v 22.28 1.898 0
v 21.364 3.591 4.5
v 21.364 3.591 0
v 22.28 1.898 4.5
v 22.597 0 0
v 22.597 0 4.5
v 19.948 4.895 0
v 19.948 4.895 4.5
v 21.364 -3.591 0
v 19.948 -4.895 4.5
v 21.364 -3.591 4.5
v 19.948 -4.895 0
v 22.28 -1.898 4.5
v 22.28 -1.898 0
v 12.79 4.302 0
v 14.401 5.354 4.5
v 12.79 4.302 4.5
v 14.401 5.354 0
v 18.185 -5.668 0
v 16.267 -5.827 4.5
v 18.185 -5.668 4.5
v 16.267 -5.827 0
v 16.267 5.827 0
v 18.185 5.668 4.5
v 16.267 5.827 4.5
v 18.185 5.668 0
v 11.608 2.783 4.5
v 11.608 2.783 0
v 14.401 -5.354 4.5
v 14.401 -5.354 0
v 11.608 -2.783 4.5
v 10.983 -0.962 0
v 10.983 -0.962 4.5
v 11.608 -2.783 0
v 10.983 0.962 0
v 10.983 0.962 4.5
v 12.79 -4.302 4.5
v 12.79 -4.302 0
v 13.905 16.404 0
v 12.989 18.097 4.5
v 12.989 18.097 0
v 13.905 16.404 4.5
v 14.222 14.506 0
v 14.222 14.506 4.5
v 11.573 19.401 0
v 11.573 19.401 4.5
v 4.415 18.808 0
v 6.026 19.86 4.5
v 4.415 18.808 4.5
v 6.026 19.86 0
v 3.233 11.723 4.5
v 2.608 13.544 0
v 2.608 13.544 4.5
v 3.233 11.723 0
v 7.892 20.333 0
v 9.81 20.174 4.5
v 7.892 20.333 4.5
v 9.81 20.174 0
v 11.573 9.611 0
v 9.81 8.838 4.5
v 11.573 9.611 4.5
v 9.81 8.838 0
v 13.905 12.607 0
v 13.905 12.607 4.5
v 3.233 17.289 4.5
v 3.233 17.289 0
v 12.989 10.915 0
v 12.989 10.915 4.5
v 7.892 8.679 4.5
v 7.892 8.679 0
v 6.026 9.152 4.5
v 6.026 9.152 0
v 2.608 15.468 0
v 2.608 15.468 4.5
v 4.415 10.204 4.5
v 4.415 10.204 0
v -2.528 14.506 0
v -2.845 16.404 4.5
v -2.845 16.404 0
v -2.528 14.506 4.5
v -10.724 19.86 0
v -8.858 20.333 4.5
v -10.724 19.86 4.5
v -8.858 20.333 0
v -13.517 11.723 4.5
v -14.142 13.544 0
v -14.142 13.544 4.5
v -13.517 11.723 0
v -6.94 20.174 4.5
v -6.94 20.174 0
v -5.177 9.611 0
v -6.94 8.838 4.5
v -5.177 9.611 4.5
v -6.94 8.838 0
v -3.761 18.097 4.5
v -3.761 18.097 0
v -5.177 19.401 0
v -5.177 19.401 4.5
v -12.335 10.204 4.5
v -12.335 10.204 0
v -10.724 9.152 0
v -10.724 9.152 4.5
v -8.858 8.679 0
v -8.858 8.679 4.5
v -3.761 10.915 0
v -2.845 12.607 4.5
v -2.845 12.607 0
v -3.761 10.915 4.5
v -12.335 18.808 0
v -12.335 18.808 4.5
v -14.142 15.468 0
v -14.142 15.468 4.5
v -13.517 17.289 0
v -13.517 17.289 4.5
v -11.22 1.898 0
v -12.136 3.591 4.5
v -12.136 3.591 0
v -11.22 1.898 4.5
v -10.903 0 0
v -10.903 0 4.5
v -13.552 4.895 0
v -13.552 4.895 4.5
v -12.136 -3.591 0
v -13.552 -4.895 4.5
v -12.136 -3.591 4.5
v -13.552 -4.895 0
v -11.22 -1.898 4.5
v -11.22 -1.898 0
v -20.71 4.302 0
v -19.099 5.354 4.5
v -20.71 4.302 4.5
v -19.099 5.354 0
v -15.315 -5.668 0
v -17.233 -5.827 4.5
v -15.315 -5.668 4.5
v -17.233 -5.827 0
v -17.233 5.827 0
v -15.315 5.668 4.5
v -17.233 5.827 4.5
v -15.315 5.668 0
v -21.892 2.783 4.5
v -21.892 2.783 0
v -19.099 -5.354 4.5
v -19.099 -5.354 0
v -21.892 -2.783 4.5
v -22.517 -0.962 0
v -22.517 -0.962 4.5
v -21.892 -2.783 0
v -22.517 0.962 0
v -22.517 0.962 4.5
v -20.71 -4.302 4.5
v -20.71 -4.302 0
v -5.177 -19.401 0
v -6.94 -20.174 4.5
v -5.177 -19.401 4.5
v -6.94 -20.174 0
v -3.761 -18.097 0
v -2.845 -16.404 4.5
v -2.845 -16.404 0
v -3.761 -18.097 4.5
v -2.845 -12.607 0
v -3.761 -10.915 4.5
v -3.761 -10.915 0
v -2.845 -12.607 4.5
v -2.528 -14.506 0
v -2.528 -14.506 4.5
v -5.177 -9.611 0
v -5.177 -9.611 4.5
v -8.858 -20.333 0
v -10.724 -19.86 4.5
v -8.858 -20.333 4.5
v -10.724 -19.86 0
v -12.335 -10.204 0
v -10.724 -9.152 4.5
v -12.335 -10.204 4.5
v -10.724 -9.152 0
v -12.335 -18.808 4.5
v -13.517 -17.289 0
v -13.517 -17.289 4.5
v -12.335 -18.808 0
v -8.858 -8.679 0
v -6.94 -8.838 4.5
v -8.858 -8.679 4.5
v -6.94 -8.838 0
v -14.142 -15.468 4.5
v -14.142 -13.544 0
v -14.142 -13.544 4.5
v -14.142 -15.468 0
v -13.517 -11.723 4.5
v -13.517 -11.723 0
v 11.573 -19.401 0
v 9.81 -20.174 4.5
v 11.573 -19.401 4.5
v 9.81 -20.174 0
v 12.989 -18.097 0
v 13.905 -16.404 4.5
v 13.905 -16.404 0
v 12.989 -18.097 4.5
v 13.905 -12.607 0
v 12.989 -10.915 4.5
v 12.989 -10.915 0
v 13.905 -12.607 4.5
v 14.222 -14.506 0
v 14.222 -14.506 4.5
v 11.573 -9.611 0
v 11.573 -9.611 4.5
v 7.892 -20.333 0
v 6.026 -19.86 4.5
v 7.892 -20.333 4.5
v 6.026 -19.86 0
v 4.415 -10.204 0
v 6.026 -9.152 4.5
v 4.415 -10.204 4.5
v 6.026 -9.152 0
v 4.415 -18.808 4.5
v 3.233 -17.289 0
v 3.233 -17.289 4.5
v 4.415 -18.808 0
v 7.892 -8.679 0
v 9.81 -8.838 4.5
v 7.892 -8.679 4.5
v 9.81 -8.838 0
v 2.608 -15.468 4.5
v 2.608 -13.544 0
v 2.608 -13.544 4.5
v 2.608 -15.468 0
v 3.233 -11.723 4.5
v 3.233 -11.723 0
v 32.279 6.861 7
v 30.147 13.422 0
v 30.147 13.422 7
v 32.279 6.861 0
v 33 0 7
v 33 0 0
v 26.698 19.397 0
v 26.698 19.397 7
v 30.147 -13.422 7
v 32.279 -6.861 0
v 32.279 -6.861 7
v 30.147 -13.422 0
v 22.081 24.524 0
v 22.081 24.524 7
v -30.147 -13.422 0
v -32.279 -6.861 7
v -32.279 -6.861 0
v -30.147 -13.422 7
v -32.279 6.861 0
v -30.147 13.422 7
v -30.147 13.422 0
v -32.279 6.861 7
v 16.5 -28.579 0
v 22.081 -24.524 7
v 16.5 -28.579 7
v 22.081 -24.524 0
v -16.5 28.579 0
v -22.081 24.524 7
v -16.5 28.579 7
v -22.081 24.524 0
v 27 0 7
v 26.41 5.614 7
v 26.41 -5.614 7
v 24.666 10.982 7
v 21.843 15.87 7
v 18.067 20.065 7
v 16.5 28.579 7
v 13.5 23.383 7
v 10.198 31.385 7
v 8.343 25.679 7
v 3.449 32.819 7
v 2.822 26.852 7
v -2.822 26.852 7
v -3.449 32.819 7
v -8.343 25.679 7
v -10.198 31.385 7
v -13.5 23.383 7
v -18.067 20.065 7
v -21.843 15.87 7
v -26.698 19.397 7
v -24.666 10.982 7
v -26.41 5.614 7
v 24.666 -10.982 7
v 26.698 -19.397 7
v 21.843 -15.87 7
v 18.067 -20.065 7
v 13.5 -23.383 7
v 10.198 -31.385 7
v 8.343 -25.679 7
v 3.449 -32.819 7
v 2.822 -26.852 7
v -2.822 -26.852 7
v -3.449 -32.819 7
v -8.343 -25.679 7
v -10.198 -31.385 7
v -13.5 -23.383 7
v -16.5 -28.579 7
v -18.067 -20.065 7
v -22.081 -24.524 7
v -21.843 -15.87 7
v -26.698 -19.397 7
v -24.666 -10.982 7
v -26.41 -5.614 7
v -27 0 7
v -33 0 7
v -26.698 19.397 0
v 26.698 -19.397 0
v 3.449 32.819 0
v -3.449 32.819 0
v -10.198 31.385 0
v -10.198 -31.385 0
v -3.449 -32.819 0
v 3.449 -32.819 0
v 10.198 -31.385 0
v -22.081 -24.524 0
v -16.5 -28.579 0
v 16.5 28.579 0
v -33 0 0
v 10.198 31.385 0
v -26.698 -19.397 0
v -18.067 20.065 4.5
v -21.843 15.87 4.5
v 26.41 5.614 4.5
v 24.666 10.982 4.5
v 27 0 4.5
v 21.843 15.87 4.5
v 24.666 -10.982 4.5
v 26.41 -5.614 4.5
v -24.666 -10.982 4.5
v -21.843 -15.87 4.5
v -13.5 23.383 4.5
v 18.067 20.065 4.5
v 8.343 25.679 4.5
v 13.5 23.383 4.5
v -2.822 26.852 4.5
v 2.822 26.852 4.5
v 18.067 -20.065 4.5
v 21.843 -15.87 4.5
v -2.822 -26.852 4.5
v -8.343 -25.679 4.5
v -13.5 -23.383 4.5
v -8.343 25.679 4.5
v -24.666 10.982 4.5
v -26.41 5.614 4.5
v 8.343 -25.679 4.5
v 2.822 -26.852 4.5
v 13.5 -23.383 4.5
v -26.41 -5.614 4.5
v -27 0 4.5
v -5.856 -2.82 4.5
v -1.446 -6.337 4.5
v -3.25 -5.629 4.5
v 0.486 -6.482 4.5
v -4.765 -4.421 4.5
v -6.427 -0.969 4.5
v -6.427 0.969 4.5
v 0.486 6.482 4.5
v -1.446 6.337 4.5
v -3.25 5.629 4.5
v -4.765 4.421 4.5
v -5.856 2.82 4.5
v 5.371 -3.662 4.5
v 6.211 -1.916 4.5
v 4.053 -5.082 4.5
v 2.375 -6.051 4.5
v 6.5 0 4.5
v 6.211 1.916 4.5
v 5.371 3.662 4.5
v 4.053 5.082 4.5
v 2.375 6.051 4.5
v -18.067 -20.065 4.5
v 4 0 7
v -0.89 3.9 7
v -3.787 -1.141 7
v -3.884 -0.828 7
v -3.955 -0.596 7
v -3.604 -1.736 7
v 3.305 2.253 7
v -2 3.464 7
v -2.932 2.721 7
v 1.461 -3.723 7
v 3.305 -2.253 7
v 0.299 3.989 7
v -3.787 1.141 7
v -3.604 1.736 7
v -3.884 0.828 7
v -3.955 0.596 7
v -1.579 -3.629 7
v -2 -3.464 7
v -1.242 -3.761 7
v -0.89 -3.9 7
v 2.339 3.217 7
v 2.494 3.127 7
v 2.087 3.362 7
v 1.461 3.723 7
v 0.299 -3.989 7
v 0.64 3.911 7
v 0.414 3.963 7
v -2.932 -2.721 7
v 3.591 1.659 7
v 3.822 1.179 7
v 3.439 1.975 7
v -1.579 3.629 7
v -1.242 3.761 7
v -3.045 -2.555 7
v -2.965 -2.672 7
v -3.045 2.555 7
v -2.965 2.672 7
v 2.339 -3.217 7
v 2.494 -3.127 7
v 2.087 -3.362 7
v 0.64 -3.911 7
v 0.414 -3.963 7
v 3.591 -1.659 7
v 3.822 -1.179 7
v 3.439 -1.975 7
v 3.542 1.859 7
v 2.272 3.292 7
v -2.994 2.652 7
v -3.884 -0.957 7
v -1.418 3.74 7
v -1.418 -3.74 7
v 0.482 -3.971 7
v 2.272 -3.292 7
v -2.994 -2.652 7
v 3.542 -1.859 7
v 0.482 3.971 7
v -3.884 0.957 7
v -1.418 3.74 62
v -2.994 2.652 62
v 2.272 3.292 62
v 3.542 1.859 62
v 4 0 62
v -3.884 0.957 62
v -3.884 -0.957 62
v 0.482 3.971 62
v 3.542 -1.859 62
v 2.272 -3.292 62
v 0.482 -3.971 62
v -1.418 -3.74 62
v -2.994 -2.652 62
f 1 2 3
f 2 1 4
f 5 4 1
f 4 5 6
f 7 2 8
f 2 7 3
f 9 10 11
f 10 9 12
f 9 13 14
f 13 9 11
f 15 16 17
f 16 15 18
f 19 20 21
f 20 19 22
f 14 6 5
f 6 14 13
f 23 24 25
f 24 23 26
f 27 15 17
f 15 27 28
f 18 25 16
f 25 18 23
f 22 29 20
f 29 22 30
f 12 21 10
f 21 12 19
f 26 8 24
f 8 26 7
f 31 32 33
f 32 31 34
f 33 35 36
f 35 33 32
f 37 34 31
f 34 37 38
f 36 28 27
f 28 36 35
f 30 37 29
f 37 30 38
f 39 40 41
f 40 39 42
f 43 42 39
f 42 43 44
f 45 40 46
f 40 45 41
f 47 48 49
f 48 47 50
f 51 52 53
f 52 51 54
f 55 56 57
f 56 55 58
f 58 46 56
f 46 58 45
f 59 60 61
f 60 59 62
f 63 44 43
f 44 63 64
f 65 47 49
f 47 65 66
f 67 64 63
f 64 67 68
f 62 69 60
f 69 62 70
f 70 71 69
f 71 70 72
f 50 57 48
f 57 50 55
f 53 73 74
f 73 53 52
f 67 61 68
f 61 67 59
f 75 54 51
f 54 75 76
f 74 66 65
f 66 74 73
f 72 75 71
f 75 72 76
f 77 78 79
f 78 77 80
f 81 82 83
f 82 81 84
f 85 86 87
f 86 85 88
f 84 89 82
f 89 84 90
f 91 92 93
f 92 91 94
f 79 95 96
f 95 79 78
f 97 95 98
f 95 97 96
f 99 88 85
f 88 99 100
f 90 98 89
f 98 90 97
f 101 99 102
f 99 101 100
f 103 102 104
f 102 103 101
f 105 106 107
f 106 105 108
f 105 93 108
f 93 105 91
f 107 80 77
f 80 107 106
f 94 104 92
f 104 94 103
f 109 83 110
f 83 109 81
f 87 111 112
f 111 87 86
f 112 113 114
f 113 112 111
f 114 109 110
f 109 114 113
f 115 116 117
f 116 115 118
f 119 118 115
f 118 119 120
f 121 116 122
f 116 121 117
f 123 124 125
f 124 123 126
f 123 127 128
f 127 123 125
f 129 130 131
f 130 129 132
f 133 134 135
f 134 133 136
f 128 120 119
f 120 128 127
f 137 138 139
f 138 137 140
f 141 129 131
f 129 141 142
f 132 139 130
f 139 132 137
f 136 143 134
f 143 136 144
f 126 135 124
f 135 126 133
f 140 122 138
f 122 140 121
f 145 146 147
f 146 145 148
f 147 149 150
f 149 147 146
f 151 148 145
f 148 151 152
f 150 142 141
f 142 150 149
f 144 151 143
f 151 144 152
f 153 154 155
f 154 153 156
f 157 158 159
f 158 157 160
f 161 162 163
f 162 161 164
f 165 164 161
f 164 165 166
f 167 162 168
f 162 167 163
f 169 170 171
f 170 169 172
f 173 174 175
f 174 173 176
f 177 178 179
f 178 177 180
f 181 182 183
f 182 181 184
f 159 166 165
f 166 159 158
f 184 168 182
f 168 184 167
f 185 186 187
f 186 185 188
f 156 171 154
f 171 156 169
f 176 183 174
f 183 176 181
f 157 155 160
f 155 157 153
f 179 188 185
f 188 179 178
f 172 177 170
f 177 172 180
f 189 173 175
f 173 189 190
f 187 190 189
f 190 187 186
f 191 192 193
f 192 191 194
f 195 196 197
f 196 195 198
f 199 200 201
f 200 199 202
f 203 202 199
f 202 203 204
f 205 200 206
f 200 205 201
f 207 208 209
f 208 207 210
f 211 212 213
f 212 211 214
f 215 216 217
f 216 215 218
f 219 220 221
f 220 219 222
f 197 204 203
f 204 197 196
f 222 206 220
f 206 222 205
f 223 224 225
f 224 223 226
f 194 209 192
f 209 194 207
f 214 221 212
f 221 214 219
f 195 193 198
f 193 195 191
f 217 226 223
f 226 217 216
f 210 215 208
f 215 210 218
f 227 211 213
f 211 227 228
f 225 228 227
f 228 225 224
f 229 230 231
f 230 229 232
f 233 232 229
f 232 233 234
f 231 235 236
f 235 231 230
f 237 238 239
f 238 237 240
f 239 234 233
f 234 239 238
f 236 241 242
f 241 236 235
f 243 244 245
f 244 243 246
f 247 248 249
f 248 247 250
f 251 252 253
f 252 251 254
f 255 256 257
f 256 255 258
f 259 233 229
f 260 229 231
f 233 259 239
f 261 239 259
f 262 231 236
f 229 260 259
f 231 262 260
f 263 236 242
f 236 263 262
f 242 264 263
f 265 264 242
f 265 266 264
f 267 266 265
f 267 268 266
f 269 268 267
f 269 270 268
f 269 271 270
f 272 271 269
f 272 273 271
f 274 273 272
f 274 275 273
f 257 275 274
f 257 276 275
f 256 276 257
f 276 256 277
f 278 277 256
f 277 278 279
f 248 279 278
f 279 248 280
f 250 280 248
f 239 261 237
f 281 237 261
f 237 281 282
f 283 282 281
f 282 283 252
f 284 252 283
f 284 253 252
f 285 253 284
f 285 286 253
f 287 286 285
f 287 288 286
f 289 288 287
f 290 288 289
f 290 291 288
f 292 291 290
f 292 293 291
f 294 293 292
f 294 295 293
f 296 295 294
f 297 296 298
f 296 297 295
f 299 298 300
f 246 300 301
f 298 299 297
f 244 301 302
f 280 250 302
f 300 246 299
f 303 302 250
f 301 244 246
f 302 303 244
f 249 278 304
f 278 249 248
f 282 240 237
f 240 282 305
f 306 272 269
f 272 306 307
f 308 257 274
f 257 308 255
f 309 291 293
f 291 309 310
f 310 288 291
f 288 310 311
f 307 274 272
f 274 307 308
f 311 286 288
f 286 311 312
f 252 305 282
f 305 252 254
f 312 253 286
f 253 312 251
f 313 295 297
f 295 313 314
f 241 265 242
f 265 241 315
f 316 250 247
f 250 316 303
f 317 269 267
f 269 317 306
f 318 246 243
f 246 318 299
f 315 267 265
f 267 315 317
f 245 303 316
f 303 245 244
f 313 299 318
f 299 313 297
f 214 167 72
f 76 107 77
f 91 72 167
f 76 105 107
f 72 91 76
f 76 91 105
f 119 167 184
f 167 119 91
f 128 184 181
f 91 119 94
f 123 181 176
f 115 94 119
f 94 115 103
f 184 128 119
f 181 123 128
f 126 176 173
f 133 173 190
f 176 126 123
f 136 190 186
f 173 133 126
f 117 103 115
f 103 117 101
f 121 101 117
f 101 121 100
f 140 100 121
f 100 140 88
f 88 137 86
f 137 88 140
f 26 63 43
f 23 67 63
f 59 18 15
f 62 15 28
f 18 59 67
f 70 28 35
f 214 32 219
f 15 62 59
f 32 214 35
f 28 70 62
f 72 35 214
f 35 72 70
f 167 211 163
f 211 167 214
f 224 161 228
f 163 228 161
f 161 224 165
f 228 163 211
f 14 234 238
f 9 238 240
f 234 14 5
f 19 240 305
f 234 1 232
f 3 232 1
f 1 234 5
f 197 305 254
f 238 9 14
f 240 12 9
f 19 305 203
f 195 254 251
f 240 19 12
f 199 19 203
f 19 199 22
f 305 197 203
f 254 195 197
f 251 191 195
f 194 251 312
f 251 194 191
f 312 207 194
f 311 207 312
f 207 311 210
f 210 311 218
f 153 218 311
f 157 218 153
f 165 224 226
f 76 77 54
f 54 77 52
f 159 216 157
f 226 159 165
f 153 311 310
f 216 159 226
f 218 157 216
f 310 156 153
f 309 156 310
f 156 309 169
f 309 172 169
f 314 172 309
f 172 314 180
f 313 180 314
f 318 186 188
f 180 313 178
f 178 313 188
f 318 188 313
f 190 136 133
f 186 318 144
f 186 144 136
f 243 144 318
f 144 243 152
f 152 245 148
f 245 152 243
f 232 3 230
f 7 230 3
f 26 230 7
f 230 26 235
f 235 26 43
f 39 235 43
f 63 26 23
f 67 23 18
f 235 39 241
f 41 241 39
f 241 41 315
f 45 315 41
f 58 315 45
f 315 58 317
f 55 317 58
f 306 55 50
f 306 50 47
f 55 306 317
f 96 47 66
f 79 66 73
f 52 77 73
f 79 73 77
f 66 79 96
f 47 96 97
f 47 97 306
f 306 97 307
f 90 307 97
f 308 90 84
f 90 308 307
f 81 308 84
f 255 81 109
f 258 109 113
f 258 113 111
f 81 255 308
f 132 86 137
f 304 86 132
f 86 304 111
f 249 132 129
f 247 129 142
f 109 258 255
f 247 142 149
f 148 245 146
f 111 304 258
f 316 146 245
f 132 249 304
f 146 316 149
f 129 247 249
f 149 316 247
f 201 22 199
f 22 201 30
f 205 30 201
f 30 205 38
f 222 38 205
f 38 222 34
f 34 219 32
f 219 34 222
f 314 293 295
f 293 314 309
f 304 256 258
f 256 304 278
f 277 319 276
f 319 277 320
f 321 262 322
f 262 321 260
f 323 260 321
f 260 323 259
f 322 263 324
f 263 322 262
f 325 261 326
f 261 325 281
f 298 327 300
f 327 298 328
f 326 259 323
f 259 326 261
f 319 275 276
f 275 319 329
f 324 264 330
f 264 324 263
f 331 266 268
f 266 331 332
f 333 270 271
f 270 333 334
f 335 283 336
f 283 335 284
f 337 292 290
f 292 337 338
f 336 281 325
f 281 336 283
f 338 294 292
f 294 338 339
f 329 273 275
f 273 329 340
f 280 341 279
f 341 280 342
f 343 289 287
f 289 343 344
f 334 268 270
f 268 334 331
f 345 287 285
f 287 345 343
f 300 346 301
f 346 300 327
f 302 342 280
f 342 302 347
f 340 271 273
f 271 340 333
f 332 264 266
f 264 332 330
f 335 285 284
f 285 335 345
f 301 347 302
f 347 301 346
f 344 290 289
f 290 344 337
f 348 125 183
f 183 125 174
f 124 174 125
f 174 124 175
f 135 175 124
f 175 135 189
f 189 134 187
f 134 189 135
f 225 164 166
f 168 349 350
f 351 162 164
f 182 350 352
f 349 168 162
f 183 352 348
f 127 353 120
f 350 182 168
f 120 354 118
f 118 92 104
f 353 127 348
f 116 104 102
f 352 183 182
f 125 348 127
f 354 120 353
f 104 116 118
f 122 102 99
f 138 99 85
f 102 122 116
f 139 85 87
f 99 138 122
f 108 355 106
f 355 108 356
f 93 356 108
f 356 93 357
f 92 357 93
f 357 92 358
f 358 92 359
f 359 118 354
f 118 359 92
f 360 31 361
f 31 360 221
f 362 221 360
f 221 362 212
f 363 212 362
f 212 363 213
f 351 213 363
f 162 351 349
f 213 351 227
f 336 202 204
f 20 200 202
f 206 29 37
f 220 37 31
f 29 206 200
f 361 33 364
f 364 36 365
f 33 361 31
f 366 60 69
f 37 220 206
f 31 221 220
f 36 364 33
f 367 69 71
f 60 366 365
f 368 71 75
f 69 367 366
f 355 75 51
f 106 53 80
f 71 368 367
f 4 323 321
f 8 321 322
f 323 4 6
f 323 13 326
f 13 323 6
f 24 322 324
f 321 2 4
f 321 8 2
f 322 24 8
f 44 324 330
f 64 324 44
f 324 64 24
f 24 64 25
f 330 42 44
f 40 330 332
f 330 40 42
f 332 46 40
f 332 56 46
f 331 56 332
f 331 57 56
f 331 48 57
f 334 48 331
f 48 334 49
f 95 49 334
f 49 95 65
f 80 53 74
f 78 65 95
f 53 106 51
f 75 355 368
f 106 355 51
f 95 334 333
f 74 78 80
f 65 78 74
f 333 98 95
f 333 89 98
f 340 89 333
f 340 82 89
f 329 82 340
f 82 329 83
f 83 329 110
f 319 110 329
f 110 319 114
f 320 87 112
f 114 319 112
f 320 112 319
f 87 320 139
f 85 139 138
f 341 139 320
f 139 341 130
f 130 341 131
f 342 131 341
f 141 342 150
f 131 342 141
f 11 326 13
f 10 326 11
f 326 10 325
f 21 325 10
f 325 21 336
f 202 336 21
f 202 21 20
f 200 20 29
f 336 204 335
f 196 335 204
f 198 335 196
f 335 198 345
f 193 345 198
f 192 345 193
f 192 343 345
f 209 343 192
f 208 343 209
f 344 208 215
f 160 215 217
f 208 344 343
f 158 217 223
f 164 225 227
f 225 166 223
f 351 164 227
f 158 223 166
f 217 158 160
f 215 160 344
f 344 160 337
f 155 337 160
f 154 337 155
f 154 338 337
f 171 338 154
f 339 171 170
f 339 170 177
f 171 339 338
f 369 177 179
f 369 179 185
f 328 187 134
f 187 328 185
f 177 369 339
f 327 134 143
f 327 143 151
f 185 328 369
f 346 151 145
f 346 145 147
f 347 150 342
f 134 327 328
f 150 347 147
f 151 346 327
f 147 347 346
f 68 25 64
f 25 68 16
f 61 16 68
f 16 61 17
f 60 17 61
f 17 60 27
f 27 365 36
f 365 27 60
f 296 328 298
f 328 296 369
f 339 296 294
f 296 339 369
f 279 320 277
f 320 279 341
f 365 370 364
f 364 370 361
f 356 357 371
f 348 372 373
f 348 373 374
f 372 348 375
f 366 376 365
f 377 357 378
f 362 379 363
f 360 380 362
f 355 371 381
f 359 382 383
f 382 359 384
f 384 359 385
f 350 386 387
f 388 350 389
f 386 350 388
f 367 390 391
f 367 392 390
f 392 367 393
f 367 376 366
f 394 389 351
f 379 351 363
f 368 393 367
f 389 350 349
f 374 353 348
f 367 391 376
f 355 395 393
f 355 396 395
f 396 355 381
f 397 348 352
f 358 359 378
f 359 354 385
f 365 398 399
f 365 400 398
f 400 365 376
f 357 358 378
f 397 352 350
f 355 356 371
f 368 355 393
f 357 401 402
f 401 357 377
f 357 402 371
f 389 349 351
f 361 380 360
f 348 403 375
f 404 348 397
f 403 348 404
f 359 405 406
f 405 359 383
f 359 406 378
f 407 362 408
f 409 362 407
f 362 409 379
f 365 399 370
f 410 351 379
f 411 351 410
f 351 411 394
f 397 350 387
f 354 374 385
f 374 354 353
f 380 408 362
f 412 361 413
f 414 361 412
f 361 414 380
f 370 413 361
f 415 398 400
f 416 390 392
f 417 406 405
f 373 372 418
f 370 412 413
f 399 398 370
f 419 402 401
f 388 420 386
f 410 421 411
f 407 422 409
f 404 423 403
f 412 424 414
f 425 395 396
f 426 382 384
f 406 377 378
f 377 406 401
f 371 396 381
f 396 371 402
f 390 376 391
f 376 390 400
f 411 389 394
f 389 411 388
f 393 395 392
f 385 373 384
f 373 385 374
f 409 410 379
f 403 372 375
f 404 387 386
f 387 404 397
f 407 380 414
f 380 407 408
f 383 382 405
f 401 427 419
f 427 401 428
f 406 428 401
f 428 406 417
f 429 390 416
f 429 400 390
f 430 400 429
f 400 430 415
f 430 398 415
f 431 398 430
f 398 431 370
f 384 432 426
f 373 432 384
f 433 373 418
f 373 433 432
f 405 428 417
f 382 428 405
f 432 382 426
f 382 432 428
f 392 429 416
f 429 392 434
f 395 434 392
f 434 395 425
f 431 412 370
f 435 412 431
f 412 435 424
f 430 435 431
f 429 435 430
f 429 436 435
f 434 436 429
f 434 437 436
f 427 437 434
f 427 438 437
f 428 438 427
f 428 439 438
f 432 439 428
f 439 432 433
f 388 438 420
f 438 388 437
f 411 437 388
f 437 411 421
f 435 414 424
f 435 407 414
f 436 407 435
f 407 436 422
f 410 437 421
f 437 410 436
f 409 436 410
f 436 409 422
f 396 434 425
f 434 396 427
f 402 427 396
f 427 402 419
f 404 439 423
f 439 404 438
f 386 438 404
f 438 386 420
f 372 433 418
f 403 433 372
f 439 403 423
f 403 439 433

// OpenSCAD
// file: constants.scad
/* sinusoid-plotter: A parametric sinusoid plotter made with OpenSCAD.
 * Copyright (C) 2013  Clayton G. Hobbs
 * 
 * This program is free software: you can redistribute it and/or modify
 * it under the terms of the GNU General Public License as published by
 * the Free Software Foundation, either version 3 of the License, or
 * (at your option) any later version.
 * 
 * This program is distributed in the hope that it will be useful,
 * but WITHOUT ANY WARRANTY; without even the implied warranty of
 * MERCHANTABILITY or FITNESS FOR A PARTICULAR PURPOSE.  See the
 * GNU General Public License for more details.
 * 
 * You should have received a copy of the GNU General Public License
 * along with this program.  If not, see <http://www.gnu.org/licenses/>.
 */

pi = 3.1415926535897932384626433832795;
// main file
/* sinusoid-plotter: A parametric sinusoid plotter made with OpenSCAD.
 * Copyright (C) 2013  Clayton G. Hobbs
 * 
 * This program is free software: you can redistribute it and/or modify
 * it under the terms of the GNU General Public License as published by
 * the Free Software Foundation, either version 3 of the License, or
 * (at your option) any later version.
 * 
 * This program is distributed in the hope that it will be useful,
 * but WITHOUT ANY WARRANTY; without even the implied warranty of
 * MERCHANTABILITY or FITNESS FOR A PARTICULAR PURPOSE.  See the
 * GNU General Public License for more details.
 * 
 * You should have received a copy of the GNU General Public License
 * along with this program.  If not, see <http://www.gnu.org/licenses/>.
 */

include <constants.scad>;

module wheel_axle(radius, height, rim_thickness, rim_height, axle_radius,
                   axle_length, holes=6, hole_radius_factor=4/3) {
	middle_radius = (radius - rim_thickness + axle_radius + rim_height)/2;
	hole_radius = hole_radius_factor*pi*middle_radius/(holes*2);

	difference() {
		// Wheel body
		cylinder(r = radius, h = height);

		// Cutout on axle side to save plastic
		translate([0, 0, height - rim_height])
		cylinder(r = radius - rim_thickness, h = height);

		// Holes through the wheel to save plastic
		for(x = [0:holes-1]) {
			translate([cos(360*x/holes)*middle_radius,
                       sin(360*x/holes)*middle_radius, -.5])
			cylinder(r = hole_radius, h = height + 1);
		}
	}

	// Axle flange
	translate([0, 0, height - rim_height])
	cylinder(r1 = axle_radius + rim_height, r2 = axle_radius,
             h = rim_height);

	// Axle shaft
	translate([0, 0, height])
	cylinder(r = axle_radius, h = axle_length);
}

wheel_axle(radius = 33, height = 7, rim_thickness = 6, rim_height = 2.5,
            axle_radius = 4, axle_length = 55);
